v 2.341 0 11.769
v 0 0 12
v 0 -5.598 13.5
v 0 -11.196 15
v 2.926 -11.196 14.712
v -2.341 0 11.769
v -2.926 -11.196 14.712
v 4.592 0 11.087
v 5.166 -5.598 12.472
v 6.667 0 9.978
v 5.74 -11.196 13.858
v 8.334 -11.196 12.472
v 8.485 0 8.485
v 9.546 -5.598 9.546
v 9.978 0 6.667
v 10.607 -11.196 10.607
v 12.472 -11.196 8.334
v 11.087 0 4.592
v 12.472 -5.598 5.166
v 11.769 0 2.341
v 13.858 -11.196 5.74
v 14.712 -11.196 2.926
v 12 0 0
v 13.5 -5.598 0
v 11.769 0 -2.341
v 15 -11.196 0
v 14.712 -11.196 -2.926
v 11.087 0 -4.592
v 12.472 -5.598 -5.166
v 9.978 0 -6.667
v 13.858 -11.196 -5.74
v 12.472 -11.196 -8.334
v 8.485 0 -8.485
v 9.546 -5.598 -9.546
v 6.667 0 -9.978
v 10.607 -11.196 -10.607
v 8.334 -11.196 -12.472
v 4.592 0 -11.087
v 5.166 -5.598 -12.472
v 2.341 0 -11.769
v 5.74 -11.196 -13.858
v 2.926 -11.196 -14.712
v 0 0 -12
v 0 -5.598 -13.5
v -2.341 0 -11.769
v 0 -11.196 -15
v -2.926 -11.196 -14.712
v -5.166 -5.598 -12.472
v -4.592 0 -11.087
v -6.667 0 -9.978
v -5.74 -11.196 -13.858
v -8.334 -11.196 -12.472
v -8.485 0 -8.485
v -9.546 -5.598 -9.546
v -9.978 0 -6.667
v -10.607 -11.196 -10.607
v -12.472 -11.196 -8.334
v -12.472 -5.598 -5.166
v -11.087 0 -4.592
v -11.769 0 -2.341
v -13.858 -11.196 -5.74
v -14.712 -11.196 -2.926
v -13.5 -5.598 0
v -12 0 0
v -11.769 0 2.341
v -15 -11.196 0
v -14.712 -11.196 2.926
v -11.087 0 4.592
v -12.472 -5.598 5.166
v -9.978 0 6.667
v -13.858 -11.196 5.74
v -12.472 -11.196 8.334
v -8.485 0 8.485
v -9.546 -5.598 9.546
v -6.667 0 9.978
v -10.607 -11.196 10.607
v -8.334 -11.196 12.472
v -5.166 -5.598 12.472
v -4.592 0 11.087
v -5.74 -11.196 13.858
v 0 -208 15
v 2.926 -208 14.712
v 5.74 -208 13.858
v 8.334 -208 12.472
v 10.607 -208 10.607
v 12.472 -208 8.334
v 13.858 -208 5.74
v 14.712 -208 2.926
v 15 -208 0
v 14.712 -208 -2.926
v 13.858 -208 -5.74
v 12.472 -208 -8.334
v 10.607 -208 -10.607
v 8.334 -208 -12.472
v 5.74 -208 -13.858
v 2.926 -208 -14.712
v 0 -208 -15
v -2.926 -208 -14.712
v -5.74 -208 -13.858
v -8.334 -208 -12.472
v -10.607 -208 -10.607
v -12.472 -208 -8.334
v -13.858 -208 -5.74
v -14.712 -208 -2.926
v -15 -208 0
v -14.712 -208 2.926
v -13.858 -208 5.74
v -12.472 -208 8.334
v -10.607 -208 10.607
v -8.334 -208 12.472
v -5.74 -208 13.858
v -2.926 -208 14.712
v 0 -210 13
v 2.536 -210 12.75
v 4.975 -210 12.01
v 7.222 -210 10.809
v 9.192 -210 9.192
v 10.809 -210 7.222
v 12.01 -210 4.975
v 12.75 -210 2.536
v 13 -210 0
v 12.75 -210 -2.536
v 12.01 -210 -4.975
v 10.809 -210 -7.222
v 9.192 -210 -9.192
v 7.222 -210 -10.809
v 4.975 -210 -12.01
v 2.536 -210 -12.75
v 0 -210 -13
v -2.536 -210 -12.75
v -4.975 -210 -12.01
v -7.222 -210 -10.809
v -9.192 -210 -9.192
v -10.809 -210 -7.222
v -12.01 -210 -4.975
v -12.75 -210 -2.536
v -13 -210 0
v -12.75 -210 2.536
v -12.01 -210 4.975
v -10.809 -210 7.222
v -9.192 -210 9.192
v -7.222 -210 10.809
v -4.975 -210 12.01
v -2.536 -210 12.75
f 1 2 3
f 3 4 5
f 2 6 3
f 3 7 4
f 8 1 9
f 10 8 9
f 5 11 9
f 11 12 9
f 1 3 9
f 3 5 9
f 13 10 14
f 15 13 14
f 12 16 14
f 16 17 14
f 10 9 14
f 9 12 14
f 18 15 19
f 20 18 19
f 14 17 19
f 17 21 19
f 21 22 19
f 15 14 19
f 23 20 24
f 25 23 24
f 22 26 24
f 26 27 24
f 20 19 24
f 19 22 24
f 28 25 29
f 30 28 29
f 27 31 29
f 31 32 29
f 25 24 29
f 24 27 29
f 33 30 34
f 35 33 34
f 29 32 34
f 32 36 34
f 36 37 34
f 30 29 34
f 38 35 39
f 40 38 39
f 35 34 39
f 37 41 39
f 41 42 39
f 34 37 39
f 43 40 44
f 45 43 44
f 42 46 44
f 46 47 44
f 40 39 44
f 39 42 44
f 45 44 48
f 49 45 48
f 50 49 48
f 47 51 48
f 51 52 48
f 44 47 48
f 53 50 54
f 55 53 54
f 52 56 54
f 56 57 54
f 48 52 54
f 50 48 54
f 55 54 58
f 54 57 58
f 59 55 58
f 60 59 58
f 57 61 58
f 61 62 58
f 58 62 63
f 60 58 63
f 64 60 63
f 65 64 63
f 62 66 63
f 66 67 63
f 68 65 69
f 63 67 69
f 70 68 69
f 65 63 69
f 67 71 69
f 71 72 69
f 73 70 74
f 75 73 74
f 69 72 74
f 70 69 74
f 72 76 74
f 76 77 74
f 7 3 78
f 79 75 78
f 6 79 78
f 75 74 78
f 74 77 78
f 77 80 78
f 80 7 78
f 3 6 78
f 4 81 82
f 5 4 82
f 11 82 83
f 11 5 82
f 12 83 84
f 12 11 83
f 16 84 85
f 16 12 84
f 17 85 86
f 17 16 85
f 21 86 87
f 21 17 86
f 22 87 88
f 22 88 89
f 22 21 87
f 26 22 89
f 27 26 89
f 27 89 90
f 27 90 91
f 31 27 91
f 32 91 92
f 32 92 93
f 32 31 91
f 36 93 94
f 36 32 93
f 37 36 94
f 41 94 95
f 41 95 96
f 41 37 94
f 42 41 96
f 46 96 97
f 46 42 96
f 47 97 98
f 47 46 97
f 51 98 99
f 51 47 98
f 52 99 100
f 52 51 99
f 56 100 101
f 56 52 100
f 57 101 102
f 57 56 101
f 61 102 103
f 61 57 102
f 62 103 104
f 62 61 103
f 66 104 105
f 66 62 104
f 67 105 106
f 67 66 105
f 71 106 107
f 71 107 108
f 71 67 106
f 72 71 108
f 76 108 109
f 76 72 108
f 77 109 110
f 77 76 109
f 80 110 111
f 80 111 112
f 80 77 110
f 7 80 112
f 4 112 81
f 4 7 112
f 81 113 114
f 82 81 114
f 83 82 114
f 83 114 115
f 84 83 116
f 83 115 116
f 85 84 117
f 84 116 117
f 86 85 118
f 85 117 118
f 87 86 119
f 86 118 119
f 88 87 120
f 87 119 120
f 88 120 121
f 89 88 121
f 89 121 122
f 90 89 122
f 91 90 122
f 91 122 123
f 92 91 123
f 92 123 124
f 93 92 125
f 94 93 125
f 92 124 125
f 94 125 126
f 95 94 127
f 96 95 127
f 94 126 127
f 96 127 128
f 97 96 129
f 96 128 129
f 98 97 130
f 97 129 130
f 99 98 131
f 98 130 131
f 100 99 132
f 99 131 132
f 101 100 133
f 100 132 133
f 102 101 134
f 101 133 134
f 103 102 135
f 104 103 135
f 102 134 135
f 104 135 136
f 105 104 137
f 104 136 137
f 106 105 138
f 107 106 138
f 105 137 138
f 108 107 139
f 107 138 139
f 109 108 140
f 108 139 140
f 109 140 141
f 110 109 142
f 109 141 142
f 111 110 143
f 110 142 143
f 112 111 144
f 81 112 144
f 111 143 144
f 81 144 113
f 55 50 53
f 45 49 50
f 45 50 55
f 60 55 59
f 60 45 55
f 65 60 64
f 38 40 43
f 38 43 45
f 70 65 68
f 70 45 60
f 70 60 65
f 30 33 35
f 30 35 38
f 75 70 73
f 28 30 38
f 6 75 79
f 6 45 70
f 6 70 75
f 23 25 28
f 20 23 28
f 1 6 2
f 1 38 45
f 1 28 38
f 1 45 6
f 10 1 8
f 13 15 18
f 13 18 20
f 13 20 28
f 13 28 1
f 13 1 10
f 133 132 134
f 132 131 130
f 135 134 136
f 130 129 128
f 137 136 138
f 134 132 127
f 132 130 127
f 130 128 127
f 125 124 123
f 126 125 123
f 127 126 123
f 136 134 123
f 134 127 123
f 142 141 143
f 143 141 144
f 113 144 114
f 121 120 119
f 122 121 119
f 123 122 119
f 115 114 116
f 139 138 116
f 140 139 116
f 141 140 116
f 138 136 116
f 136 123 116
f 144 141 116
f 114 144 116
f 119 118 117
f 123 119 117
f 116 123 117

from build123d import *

# Parameters (mm, degrees)
SKETCH1_R           = 15
BOSS_EXTRUDE1_DEPTH = 210
CHAMFER1_SIZE       = 2
CHAMFER2_SIZE       = 3
CHAMFER2_SIZE2      = 11.196152423


with BuildPart() as part:
    # Sketch1 → Boss-Extrude1 (new body)
    with BuildSketch(Plane(origin=(0, 0, 0), x_dir=(1, 0, 0), z_dir=(0, 1, 0))):
        with Locations(Location((0, 0, 0), (0, 0, 270))):
            Circle(SKETCH1_R)
    extrude(amount=-BOSS_EXTRUDE1_DEPTH)

    # Chamfer1
    chamfer1_edges = [part.edges().sort_by_distance(p)[0] for p in [
        (0, -210, -15),
    ]]
    chamfer(chamfer1_edges, length=CHAMFER1_SIZE)

    # Chamfer2
    chamfer2_edges = [part.edges().sort_by_distance(p)[0] for p in [
        (0, 0, -15),
    ]]
    chamfer2_side = [part.faces().sort_by_distance(p)[0] for p in [
        (0, 0, 0),
    ]]
    chamfer(chamfer2_edges, length=CHAMFER2_SIZE, length2=CHAMFER2_SIZE2, reference=chamfer2_side[0])


solid = part.part
